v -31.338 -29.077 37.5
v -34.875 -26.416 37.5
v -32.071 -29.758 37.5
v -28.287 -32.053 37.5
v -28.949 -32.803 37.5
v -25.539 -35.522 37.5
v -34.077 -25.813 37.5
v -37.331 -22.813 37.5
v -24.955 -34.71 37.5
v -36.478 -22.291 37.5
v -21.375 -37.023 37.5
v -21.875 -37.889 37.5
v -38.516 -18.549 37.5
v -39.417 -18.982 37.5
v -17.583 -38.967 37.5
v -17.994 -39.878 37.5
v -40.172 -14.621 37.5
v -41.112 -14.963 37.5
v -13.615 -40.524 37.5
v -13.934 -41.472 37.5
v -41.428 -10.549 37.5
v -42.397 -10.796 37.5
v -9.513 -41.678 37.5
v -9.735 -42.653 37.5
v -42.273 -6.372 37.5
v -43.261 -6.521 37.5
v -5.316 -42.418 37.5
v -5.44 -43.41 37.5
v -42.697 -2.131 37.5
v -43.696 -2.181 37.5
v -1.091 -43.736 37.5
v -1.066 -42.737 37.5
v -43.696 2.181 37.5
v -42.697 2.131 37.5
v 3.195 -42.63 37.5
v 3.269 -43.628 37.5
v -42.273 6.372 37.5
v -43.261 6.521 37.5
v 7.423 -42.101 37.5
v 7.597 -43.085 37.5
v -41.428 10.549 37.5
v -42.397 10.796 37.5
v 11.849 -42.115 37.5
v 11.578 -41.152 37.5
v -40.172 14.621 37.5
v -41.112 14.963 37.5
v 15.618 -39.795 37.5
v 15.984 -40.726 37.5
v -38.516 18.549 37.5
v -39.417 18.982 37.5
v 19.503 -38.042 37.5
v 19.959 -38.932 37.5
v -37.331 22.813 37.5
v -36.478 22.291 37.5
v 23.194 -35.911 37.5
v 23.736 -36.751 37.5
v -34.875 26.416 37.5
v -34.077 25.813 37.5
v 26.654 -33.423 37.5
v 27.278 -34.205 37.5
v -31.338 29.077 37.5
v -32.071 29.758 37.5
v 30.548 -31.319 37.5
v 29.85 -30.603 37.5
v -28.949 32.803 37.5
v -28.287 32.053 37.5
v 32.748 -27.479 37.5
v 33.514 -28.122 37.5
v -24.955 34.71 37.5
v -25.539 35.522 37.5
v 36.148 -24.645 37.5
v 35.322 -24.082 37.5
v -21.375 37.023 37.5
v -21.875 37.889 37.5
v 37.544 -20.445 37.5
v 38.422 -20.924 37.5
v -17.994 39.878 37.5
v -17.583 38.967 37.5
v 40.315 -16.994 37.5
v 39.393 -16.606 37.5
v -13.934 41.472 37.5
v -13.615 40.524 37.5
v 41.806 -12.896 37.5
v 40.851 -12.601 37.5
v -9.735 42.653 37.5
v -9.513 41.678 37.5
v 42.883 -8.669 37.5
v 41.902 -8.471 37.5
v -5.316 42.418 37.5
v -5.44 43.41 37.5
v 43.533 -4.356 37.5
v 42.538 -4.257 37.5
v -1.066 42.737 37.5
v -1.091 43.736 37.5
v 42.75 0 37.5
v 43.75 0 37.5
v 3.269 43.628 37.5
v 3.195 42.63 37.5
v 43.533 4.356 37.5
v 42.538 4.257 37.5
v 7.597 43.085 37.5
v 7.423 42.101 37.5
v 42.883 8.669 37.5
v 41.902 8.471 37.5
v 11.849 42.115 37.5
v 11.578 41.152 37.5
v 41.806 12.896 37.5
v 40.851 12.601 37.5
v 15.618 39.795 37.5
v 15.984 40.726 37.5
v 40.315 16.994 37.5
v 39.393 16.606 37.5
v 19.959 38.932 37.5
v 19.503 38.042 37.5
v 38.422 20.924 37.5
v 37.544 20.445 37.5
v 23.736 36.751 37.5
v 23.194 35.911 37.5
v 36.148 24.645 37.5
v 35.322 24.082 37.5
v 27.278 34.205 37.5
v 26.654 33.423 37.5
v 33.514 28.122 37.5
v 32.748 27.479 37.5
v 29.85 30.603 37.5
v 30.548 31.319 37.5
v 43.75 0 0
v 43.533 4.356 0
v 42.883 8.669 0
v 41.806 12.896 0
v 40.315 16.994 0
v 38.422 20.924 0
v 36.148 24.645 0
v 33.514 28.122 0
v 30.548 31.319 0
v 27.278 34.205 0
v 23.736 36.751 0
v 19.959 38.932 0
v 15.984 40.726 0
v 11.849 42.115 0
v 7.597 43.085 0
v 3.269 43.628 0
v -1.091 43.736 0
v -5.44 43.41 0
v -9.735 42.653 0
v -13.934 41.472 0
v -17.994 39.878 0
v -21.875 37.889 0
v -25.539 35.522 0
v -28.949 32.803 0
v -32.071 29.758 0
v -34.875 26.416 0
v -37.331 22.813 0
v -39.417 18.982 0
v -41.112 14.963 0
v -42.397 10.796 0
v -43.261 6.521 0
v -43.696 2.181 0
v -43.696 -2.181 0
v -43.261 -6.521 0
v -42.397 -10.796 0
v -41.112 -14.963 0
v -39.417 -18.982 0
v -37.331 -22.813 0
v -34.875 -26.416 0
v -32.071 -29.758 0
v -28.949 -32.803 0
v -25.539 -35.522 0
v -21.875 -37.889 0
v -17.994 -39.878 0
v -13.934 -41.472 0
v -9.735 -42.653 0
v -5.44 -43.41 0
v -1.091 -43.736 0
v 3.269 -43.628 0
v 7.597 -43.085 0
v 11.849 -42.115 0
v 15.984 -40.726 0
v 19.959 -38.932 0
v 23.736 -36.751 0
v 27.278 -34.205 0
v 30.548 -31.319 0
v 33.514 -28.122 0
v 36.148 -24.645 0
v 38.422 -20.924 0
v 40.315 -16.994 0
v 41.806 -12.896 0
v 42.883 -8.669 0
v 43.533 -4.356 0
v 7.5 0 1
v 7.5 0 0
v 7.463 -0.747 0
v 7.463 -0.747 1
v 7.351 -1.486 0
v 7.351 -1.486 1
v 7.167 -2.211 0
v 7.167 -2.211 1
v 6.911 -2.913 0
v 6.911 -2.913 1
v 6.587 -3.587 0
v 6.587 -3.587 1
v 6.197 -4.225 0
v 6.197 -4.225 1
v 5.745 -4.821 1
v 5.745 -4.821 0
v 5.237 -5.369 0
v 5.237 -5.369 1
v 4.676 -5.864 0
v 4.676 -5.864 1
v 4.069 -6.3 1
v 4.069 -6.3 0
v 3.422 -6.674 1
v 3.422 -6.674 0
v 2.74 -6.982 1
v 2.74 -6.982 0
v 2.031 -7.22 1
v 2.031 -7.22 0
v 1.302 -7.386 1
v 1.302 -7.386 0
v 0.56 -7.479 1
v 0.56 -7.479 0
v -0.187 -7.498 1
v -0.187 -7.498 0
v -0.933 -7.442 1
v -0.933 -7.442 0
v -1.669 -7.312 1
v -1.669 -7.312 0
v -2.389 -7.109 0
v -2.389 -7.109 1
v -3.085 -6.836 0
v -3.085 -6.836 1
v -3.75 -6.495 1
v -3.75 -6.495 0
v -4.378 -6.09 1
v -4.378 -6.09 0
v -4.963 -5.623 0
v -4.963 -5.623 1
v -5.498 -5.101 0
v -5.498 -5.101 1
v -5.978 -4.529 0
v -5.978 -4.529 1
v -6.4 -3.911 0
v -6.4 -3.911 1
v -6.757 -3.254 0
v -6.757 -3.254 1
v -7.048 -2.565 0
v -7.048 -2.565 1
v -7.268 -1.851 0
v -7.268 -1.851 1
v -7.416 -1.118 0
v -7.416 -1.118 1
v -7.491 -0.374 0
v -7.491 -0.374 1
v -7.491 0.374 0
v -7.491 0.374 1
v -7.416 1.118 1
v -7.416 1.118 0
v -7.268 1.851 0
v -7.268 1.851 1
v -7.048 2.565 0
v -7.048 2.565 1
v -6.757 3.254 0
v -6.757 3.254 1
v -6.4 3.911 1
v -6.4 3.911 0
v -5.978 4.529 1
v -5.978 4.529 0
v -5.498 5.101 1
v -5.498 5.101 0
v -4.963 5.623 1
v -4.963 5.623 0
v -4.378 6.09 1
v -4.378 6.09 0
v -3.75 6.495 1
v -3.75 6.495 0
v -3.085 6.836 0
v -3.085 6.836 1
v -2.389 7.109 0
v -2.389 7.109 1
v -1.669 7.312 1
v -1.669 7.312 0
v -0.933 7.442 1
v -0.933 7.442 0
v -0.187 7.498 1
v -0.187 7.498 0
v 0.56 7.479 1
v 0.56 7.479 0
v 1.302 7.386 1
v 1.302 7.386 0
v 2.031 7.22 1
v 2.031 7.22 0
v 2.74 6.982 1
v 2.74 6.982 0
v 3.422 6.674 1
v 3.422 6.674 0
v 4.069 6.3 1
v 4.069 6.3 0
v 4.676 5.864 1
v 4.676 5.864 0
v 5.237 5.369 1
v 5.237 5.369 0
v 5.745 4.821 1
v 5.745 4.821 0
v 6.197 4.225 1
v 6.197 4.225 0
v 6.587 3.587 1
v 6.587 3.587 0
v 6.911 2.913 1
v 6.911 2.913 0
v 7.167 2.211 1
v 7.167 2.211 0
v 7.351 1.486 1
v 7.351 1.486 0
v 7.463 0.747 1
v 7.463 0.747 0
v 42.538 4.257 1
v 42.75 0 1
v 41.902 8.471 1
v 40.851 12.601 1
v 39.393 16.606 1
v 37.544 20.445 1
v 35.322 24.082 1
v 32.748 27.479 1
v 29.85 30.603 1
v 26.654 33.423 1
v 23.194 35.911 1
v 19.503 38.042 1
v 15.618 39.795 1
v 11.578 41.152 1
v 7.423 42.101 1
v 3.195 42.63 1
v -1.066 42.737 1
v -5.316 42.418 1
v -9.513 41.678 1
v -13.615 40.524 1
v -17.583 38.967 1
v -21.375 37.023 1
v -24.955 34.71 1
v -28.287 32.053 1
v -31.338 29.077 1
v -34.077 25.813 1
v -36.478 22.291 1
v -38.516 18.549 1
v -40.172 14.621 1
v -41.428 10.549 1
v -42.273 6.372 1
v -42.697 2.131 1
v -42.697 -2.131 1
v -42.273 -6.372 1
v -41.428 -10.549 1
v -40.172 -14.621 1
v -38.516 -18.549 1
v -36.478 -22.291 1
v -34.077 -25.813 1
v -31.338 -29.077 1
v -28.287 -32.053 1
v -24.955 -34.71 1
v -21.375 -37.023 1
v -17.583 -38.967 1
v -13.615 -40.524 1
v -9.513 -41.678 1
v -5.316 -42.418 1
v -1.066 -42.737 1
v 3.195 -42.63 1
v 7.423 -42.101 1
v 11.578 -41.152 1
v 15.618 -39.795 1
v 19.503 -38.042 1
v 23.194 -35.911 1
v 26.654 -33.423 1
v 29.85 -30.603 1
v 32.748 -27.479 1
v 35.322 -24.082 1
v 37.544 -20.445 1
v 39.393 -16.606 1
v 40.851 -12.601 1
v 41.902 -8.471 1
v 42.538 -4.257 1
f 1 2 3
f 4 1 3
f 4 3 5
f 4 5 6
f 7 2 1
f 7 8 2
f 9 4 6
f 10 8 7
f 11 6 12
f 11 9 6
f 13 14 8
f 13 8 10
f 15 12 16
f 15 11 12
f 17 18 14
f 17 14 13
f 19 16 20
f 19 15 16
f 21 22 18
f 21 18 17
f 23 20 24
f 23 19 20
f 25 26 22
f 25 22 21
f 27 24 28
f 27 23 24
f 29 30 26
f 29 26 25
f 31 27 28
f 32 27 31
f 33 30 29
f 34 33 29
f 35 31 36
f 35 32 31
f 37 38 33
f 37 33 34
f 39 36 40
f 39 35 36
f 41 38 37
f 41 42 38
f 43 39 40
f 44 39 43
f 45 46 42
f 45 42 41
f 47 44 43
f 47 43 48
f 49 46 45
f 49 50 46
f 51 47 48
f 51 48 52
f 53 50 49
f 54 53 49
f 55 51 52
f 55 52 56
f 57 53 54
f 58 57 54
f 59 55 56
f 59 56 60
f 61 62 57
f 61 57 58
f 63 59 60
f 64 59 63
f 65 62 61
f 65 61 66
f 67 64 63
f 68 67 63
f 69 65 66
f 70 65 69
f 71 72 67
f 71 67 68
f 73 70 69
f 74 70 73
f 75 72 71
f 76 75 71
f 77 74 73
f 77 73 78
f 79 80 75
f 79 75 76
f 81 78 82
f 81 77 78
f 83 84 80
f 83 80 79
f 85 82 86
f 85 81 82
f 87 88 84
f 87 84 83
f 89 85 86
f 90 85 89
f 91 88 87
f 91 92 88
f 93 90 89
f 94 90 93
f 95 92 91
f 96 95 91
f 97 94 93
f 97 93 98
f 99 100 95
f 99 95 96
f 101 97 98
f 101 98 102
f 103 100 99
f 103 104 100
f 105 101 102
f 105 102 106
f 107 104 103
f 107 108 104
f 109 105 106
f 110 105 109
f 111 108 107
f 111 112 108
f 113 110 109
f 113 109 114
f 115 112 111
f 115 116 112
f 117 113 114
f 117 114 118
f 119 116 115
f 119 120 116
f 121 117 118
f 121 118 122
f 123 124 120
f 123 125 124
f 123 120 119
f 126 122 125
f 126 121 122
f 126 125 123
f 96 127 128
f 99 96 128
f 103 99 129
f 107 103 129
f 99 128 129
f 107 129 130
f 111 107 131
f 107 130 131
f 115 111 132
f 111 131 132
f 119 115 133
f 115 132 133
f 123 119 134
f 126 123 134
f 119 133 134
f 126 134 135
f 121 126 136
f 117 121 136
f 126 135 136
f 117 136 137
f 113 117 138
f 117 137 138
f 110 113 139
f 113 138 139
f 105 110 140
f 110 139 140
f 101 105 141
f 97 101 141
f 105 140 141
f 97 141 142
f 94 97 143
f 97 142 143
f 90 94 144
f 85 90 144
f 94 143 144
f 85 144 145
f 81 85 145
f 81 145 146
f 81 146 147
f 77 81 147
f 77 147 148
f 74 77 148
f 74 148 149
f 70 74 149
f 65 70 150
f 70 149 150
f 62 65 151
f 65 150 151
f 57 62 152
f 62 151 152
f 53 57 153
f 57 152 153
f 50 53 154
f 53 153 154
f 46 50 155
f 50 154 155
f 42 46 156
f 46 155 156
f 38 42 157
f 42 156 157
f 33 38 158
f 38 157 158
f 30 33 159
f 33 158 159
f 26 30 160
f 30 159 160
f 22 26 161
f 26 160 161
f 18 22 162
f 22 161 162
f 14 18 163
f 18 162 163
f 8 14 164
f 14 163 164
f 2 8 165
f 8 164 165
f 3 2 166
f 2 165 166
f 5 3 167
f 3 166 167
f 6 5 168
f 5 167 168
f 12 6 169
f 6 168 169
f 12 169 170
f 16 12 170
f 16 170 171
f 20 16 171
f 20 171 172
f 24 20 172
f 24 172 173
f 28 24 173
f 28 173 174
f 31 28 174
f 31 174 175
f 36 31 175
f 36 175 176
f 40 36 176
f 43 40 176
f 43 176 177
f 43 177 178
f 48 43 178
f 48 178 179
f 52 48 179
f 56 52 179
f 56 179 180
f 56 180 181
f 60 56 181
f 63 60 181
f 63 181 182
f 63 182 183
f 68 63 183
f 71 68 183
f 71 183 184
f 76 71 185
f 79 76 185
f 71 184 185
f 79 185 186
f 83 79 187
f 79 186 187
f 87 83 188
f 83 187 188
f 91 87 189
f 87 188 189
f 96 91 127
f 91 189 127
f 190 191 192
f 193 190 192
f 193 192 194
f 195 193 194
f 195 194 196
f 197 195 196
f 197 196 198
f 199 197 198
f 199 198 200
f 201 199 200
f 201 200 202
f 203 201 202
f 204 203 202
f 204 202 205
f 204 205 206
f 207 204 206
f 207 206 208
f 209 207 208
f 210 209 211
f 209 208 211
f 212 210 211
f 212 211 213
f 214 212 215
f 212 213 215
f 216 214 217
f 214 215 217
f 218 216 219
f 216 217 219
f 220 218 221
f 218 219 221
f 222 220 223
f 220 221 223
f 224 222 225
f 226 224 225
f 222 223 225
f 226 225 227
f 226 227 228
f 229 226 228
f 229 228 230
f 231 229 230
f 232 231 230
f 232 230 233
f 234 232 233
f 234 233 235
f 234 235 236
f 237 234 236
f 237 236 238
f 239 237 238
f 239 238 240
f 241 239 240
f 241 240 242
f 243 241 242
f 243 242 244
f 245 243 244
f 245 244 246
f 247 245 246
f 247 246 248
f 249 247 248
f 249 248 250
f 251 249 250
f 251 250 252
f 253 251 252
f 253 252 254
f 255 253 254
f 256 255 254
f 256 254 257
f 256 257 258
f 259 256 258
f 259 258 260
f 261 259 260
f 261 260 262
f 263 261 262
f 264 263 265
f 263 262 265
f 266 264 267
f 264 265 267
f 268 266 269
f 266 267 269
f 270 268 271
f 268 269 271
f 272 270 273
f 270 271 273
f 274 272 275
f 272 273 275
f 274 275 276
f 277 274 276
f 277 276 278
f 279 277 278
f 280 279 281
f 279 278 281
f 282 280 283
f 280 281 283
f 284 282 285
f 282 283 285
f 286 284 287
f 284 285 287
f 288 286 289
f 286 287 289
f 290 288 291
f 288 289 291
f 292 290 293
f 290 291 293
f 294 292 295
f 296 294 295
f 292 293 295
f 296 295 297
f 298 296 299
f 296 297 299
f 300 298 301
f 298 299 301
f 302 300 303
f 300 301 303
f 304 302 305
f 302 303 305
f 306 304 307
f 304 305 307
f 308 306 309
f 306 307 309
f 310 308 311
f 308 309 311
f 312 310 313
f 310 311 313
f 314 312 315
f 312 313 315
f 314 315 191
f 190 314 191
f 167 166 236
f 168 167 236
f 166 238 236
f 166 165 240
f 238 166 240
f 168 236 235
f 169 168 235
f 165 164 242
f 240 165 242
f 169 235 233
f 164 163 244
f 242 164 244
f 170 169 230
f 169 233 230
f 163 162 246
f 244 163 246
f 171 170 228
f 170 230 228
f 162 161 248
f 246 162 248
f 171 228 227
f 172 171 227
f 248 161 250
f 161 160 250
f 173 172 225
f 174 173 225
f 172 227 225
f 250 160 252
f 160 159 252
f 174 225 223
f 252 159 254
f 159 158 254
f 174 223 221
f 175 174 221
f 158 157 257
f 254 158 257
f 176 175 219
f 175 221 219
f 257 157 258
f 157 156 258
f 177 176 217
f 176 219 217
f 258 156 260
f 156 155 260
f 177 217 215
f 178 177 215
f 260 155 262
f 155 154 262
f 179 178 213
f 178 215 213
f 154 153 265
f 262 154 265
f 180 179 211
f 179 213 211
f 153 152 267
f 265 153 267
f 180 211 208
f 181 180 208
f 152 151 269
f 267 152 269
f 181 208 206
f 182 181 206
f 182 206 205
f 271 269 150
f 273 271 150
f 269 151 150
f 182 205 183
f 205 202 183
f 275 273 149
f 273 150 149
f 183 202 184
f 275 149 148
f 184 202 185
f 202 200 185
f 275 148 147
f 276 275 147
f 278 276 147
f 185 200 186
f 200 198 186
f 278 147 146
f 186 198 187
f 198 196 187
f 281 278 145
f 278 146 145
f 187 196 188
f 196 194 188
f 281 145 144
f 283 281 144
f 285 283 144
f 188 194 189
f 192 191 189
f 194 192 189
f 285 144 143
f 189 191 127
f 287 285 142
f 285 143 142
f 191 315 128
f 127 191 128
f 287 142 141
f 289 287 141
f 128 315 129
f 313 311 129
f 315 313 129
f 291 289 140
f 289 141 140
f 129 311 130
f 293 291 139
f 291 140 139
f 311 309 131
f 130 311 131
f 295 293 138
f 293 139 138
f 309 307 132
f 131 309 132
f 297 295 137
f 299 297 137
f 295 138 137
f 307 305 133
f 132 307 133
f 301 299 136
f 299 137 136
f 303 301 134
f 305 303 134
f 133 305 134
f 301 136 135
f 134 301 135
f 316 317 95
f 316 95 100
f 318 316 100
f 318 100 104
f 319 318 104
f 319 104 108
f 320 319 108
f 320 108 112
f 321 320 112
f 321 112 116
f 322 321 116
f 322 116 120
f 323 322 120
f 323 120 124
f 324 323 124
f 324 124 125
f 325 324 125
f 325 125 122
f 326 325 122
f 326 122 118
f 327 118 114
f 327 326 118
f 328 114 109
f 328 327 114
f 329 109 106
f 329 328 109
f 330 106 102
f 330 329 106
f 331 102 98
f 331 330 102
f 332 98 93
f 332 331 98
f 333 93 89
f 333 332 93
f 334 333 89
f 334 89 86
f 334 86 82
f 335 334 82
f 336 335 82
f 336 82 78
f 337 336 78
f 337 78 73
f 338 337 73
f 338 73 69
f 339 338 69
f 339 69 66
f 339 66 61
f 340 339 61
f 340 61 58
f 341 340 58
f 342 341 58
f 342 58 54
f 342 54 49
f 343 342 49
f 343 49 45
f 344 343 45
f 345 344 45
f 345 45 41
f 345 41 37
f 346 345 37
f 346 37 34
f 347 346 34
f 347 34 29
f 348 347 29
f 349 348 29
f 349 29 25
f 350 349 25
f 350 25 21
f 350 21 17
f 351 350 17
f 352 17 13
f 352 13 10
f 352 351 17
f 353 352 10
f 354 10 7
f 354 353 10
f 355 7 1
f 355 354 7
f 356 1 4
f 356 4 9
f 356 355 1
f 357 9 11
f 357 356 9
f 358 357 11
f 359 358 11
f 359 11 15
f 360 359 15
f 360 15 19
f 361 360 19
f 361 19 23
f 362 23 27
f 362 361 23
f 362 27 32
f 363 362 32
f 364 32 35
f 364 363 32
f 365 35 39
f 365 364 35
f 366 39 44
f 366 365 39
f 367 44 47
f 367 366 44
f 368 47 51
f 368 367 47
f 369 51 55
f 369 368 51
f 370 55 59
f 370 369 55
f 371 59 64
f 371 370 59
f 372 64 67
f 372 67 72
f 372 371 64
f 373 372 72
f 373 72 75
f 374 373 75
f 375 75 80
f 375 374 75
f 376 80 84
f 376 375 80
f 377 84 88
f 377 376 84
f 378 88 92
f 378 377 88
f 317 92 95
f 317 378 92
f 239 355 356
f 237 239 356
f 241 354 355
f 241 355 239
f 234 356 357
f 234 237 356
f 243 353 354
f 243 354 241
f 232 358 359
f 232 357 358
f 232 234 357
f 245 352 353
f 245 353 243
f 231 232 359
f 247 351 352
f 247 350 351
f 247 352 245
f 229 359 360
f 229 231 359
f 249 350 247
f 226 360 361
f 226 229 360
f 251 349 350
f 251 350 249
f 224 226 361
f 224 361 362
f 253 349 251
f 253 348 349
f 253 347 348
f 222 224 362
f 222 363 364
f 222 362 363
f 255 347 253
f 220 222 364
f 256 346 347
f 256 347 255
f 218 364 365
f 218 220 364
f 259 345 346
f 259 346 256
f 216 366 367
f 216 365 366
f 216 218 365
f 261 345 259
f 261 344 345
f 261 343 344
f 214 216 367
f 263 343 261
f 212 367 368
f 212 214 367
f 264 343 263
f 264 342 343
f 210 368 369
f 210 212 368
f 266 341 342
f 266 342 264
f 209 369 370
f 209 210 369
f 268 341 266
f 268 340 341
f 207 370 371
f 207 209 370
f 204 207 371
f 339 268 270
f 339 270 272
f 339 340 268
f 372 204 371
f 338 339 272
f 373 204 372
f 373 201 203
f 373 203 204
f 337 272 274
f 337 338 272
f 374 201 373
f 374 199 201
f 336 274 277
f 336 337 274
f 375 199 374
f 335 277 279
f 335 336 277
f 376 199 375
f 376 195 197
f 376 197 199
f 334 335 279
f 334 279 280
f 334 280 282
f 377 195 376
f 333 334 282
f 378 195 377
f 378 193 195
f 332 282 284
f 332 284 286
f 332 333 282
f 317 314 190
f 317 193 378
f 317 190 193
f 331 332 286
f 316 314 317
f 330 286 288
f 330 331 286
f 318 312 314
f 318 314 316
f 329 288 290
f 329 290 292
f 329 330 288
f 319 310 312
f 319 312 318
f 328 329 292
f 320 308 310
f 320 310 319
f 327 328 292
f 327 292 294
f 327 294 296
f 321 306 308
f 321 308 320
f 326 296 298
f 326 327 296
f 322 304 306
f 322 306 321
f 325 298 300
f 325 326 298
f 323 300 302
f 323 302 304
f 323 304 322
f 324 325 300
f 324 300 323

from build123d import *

# Parameters (mm, degrees)
F0_R     = 43.75
F1_DEPTH = 37.5
F2_T     = -1
F3_R     = 7.5
F4_DEPTH = 25.4


with BuildPart() as f1:
    # F0 (on Top) → F1 (new body)
    with BuildSketch(Plane.XY):
        Circle(F0_R)
    extrude(amount=F1_DEPTH)

    # F2
    f2_openings = [f1.faces().sort_by_distance(p)[0] for p in [
        (0, 0, 37.5),
    ]]
    offset(amount=F2_T, openings=f2_openings)

    # F3 (on face) → F4 (cut)
    with BuildSketch(Plane(origin=(0, 0, 0), x_dir=(1, 0, 0), z_dir=(0, 0, -1))):
        Circle(F3_R)
    extrude(amount=-F4_DEPTH, mode=Mode.SUBTRACT)


solid = f1.part
